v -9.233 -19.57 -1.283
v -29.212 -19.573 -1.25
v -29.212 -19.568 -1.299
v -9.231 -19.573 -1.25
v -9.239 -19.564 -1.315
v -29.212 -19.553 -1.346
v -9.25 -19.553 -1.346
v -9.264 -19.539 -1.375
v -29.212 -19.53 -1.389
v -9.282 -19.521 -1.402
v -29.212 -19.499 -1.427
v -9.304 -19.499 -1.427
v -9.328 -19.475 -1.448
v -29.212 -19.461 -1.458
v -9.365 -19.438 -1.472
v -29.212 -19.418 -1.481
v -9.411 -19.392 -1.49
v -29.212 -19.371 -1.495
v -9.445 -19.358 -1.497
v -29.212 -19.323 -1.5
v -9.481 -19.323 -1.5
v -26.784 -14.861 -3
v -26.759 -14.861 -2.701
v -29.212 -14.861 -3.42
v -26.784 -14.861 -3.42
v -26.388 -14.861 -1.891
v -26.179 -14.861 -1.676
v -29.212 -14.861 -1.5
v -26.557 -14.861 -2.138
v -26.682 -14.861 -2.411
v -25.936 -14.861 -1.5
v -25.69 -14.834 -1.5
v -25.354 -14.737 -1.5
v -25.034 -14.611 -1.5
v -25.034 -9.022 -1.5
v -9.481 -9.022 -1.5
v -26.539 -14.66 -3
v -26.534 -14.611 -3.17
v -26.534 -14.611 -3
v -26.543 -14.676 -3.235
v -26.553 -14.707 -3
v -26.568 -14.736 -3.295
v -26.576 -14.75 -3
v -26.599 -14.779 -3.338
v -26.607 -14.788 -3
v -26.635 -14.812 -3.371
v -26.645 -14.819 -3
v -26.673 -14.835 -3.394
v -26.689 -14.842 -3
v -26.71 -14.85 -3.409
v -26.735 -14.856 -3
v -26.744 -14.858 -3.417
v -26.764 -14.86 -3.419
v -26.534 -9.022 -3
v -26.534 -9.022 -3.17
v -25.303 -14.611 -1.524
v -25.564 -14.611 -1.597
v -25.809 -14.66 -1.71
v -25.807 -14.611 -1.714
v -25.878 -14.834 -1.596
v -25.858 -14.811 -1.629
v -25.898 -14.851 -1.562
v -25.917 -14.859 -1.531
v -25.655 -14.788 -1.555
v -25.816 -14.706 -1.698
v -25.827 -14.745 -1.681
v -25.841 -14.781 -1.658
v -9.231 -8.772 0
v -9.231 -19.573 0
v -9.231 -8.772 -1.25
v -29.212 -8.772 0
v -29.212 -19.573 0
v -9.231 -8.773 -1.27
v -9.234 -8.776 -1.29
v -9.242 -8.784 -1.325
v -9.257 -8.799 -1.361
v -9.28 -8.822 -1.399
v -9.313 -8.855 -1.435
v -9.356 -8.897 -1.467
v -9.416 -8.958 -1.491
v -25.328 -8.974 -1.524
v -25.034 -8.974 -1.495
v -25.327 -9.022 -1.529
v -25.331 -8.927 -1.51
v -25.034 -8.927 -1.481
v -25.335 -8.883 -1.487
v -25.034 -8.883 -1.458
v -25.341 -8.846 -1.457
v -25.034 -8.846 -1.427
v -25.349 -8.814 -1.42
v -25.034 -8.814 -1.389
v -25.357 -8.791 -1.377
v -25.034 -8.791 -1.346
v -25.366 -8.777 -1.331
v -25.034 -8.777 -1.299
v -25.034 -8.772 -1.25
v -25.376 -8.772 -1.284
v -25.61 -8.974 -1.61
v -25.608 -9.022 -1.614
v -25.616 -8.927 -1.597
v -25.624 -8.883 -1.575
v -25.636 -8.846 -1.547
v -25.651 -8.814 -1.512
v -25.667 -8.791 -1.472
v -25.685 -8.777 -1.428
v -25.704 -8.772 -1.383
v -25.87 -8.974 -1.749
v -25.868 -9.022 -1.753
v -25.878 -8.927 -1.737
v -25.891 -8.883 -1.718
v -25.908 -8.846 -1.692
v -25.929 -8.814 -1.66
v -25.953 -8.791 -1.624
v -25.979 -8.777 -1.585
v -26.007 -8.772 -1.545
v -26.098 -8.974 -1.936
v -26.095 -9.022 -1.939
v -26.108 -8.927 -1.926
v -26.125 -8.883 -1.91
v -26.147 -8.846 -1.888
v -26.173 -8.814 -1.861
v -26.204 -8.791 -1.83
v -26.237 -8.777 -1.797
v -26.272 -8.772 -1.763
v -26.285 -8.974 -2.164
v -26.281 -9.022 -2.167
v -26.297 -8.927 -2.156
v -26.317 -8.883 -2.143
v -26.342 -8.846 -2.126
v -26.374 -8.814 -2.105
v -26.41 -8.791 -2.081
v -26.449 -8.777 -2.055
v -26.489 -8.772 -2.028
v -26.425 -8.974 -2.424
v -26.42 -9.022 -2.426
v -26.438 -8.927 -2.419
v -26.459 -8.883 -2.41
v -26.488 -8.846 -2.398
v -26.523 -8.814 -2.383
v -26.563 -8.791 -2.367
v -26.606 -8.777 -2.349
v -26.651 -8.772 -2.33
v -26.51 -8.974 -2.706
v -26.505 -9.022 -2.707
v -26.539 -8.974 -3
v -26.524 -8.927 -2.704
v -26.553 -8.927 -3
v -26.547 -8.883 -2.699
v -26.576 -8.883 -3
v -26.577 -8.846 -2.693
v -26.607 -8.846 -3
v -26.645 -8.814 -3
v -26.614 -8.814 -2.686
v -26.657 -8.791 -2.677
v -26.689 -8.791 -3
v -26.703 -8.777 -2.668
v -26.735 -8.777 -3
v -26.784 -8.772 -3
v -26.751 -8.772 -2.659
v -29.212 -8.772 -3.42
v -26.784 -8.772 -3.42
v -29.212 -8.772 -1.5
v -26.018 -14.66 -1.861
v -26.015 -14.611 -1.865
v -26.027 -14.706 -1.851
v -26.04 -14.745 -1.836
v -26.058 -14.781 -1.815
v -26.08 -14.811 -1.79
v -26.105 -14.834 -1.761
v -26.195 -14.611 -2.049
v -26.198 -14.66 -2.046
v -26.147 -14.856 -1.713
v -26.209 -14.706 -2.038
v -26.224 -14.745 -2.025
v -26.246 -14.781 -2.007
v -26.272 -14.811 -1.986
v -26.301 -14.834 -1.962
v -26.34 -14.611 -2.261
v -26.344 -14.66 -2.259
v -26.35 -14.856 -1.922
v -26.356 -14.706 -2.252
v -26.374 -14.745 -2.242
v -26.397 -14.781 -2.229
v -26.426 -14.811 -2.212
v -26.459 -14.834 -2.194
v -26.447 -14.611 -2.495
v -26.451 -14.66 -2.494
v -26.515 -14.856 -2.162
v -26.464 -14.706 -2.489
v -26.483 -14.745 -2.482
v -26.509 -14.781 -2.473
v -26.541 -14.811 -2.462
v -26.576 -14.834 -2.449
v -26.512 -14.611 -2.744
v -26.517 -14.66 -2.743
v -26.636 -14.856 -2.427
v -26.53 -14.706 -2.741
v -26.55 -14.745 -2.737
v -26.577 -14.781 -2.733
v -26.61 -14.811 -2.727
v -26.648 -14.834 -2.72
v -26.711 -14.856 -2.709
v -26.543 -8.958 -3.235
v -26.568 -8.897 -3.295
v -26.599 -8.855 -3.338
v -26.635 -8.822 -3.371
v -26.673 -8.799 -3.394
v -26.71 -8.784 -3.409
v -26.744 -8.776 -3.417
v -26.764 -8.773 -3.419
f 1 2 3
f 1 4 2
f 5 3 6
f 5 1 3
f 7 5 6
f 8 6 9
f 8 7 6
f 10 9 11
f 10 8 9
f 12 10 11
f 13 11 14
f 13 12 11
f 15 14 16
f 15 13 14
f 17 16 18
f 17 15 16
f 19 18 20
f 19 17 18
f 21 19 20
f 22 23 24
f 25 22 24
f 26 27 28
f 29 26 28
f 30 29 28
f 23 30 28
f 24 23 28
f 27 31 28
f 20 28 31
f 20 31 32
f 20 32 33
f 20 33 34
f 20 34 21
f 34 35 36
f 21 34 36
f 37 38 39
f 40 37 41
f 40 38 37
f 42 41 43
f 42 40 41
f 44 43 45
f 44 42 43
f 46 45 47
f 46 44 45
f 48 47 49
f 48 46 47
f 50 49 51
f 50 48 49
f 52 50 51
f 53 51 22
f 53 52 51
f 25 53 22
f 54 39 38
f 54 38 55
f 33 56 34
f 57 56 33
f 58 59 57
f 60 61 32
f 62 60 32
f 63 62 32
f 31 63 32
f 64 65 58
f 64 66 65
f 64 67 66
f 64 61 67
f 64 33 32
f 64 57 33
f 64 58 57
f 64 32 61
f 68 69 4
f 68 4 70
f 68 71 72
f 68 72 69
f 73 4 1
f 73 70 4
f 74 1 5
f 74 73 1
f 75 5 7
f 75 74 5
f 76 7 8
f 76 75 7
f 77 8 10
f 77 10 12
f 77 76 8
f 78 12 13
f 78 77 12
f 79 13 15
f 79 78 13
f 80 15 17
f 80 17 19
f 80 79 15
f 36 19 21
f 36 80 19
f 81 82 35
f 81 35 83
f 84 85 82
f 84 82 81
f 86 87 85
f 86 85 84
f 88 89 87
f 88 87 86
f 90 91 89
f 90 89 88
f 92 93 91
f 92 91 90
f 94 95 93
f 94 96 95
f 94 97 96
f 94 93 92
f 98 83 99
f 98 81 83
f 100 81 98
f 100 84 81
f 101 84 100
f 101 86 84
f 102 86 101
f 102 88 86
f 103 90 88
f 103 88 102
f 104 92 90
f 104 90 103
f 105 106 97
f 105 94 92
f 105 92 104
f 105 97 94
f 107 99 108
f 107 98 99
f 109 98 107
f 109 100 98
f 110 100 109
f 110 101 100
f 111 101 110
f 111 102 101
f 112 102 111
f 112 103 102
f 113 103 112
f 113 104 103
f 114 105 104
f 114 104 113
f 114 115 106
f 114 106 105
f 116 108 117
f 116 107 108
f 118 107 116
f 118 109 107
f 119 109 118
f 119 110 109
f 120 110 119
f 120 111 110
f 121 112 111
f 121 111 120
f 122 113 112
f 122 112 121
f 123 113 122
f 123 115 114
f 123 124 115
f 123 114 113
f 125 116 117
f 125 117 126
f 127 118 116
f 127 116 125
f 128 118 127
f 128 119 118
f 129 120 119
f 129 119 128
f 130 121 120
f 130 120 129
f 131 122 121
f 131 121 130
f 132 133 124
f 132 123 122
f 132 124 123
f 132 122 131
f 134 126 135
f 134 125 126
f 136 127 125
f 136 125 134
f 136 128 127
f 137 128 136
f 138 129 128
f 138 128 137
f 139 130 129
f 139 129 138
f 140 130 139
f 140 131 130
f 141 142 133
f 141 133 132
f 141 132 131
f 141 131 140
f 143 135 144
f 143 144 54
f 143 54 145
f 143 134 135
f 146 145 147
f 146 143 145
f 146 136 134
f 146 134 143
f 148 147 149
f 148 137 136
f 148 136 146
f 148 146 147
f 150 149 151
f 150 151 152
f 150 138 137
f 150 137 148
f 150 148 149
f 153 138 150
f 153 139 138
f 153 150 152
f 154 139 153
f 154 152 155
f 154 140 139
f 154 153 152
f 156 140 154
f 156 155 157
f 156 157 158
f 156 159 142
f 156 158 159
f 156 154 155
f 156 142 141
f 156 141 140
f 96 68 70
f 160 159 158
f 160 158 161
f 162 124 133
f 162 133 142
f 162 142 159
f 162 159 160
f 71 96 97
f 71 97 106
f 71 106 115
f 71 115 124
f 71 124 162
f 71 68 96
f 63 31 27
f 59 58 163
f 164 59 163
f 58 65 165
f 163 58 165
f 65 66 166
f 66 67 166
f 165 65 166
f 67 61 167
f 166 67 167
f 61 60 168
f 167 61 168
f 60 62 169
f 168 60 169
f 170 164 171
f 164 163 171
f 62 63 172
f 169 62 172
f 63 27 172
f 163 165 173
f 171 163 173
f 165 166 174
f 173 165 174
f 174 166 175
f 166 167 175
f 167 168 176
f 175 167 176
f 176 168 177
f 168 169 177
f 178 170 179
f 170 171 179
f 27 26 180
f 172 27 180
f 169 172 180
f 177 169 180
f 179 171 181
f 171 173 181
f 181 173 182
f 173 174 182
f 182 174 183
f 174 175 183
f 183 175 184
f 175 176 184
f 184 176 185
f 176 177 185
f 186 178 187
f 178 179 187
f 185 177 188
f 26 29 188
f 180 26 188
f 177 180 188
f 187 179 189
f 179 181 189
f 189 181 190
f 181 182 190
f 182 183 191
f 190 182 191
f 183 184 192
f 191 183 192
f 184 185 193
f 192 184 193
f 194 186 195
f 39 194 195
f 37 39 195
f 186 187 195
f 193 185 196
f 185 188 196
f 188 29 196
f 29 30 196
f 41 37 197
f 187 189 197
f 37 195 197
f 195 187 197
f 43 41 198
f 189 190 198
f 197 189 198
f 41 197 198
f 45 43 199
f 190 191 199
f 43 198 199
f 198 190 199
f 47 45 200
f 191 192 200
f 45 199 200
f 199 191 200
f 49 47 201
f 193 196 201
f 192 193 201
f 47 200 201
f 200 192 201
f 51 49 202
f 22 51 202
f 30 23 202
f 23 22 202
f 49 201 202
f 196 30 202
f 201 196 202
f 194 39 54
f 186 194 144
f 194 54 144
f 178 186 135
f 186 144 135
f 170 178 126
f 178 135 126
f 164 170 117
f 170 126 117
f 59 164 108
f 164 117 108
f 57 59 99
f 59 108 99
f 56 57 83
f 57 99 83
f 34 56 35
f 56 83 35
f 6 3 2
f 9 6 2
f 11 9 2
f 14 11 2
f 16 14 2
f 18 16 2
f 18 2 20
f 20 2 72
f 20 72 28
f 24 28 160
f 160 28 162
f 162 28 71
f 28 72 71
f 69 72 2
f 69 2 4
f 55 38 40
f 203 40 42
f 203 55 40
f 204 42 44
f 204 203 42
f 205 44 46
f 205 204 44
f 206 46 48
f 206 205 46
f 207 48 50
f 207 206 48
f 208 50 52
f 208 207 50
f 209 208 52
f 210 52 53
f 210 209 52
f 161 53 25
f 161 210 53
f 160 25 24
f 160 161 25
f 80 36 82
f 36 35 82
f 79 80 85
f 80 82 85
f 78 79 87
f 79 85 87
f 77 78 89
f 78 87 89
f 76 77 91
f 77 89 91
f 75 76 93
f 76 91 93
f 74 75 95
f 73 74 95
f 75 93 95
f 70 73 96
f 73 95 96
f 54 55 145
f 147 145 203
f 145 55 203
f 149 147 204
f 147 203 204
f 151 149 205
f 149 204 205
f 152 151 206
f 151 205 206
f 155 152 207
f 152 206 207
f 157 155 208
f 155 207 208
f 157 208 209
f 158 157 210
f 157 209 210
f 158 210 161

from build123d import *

# Parameters (mm, degrees)
SKETCH1_W           = 19.981739869
SKETCH1_H           = 10.800167474
BOSS_EXTRUDE1_DEPTH = 1.5
SKETCH3_W           = 2.678049678
SKETCH3_H           = 6.088868787
BOSS_EXTRUDE2_DEPTH = 1.920000865
FILLET1_R           = 1.5
FILLET2_R           = 0.25


with BuildPart() as part:
    # Sketch1 → Boss-Extrude1 (new body)
    with BuildSketch(Plane.XY):
        with Locations((-19.22144379, -14.172432084)):
            Rectangle(SKETCH1_W, SKETCH1_H)
    extrude(amount=-BOSS_EXTRUDE1_DEPTH)

    # Sketch3 → Boss-Extrude2 (add)
    with BuildSketch(Plane(origin=(0, 0, -1.5), x_dir=(-1, 0, 0), z_dir=(0, 0, -1))):
        with Locations((27.873288885, -11.816782741)):
            Rectangle(SKETCH3_W, SKETCH3_H)
    extrude(amount=BOSS_EXTRUDE2_DEPTH)

    # Fillet1
    fillet1_edges = [part.edges().sort_by_distance(p)[0] for p in [
        (-26.534264046, -11.81678274, -1.5),
    ]]
    fillet(fillet1_edges, radius=FILLET1_R)

    # Fillet2
    fillet2_edges = [part.edges().sort_by_distance(p)[0] for p in [
        (-26.534264046, -14.861217134, -3.210000433),
        (-26.534264046, -11.81678274, -3.420000865),
        (-26.534264046, -8.772348347, -3.210000433),
        (-19.221443789, -19.572515821, -1.5),
        (-26.094924218, -14.861217134, -1.939339828),
        (-26.094924218, -8.772348347, -1.939339828),
        (-9.230573855, -14.172432084, -1.5),
        (-17.13241895, -8.772348347, -1.5),
    ]]
    fillet(fillet2_edges, radius=FILLET2_R)


solid = part.part
